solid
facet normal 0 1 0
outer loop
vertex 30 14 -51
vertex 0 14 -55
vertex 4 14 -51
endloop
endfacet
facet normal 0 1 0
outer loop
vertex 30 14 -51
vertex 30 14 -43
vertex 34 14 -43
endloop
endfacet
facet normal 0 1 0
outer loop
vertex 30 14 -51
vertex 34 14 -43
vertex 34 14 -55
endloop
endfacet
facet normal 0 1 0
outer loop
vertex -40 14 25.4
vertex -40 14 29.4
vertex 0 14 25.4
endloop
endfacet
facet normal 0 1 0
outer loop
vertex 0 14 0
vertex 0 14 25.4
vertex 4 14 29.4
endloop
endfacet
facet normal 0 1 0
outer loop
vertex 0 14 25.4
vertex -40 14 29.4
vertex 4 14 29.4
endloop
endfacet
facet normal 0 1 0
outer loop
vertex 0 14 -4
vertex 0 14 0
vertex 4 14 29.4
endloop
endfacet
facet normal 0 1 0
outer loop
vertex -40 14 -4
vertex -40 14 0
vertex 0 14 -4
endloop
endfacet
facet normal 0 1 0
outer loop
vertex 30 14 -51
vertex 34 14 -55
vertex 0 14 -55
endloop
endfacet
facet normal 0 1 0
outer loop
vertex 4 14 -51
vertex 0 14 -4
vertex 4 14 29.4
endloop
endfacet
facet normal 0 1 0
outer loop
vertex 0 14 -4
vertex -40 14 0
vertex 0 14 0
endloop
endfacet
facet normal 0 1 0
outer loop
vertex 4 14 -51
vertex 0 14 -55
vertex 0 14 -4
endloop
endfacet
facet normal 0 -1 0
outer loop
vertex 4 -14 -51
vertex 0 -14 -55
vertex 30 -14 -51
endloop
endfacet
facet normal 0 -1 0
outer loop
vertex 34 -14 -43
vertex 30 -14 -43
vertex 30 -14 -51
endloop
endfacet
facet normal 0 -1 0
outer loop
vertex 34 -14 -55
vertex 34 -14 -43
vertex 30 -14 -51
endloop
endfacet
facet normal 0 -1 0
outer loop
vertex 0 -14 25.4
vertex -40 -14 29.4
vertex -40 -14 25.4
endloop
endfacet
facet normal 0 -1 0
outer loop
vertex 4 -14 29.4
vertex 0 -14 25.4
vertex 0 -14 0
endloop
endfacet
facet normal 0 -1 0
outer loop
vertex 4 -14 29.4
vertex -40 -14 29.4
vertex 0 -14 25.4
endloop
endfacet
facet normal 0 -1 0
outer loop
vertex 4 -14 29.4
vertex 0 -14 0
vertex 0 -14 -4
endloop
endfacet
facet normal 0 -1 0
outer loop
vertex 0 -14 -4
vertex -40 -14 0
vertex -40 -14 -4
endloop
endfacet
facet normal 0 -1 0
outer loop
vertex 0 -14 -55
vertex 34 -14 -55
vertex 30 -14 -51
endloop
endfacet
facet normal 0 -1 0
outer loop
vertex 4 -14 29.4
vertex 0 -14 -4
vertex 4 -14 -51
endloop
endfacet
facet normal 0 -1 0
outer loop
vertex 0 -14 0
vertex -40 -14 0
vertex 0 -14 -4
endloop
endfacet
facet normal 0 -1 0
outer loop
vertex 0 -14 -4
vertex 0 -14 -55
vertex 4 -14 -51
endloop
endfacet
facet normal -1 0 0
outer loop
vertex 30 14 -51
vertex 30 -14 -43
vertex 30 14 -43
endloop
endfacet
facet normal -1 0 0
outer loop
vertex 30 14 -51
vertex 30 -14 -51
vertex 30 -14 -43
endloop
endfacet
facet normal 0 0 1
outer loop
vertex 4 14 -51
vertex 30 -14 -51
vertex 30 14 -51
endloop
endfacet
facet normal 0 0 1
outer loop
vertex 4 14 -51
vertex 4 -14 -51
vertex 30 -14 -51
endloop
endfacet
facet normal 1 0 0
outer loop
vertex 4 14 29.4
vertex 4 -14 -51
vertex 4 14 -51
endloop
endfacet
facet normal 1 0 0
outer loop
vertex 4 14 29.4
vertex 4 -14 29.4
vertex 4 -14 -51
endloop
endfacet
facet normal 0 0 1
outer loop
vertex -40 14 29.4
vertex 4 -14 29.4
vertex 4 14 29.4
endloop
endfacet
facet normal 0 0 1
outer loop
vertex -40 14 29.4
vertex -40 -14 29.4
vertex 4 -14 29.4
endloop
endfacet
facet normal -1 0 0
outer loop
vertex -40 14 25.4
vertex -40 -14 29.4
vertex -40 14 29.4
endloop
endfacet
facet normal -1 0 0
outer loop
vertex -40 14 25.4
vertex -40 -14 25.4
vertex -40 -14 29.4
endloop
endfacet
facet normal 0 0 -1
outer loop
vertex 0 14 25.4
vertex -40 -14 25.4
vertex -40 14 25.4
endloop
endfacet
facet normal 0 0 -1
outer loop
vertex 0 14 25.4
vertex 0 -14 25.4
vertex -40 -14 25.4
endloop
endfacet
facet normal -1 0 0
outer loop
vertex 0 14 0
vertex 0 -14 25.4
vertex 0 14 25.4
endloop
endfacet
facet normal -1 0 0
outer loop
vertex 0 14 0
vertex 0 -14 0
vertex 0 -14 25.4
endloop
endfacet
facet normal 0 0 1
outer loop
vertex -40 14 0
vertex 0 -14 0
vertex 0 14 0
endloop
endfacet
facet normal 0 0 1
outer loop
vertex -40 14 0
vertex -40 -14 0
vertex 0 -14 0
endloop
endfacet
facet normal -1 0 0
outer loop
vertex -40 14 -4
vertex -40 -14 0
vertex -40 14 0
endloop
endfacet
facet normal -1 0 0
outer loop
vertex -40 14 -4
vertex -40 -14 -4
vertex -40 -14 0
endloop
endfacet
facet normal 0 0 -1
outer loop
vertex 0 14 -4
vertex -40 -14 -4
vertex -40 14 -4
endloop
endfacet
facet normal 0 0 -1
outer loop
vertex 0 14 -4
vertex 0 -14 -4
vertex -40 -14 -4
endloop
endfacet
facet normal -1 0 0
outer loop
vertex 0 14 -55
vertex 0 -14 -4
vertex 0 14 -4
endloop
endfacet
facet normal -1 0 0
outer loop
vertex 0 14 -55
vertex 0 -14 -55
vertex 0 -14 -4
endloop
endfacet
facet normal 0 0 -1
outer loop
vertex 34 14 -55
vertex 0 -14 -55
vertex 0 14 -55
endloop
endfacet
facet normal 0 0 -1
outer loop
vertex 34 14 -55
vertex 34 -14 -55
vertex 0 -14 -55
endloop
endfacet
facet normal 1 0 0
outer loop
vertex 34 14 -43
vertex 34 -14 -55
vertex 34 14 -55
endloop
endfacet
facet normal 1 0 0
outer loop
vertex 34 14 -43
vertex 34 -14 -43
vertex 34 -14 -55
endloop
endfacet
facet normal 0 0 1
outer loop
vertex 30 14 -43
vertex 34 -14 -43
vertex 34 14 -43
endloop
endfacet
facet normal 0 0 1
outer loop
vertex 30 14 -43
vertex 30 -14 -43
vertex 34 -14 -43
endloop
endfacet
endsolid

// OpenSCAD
// Forge catalog: desk-edge clamp hook (headphones, bags, cables)
// Units: mm. Z-up. Printed as designed: hook profile extruded along Y, so no overhangs beyond the lip.
edge_thickness = 25;   // thickness of the desk/shelf edge the clamp wraps (mm)
clamp_depth    = 40;   // how far the clamp reaches onto the desk top and underside (mm)
hook_width     = 28;   // width of the part along the desk edge (mm)
hook_drop      = 55;   // how far the hook arm hangs below the desk underside (mm)
hook_reach     = 30;   // how far the hook tip reaches out from the edge (mm)
wall           = 4;    // material thickness (mm)
lip            = 8;    // upturned lip at the hook tip (mm)
fit            = 0.4;  // clearance added to edge_thickness (mm)

t  = edge_thickness + fit;
// 2D profile in the XZ plane: x = outward from the desk edge (negative = under desk), z = up.
module profile() {
    // top plate on the desk
    translate([-clamp_depth, t]) square([clamp_depth + wall, wall]);
    // vertical plate at the desk edge
    translate([0, -hook_drop]) square([wall, t + 2*wall + hook_drop - wall]);
    // underside plate
    translate([-clamp_depth, -wall]) square([clamp_depth + wall, wall]);
    // hook arm: bottom of the vertical plate, reaching outward
    translate([0, -hook_drop]) square([hook_reach + wall, wall]);
    // upturned lip at the tip
    translate([hook_reach, -hook_drop]) square([wall, lip + wall]);
}
rotate([90, 0, 0]) linear_extrude(height = hook_width, center = true) profile();
